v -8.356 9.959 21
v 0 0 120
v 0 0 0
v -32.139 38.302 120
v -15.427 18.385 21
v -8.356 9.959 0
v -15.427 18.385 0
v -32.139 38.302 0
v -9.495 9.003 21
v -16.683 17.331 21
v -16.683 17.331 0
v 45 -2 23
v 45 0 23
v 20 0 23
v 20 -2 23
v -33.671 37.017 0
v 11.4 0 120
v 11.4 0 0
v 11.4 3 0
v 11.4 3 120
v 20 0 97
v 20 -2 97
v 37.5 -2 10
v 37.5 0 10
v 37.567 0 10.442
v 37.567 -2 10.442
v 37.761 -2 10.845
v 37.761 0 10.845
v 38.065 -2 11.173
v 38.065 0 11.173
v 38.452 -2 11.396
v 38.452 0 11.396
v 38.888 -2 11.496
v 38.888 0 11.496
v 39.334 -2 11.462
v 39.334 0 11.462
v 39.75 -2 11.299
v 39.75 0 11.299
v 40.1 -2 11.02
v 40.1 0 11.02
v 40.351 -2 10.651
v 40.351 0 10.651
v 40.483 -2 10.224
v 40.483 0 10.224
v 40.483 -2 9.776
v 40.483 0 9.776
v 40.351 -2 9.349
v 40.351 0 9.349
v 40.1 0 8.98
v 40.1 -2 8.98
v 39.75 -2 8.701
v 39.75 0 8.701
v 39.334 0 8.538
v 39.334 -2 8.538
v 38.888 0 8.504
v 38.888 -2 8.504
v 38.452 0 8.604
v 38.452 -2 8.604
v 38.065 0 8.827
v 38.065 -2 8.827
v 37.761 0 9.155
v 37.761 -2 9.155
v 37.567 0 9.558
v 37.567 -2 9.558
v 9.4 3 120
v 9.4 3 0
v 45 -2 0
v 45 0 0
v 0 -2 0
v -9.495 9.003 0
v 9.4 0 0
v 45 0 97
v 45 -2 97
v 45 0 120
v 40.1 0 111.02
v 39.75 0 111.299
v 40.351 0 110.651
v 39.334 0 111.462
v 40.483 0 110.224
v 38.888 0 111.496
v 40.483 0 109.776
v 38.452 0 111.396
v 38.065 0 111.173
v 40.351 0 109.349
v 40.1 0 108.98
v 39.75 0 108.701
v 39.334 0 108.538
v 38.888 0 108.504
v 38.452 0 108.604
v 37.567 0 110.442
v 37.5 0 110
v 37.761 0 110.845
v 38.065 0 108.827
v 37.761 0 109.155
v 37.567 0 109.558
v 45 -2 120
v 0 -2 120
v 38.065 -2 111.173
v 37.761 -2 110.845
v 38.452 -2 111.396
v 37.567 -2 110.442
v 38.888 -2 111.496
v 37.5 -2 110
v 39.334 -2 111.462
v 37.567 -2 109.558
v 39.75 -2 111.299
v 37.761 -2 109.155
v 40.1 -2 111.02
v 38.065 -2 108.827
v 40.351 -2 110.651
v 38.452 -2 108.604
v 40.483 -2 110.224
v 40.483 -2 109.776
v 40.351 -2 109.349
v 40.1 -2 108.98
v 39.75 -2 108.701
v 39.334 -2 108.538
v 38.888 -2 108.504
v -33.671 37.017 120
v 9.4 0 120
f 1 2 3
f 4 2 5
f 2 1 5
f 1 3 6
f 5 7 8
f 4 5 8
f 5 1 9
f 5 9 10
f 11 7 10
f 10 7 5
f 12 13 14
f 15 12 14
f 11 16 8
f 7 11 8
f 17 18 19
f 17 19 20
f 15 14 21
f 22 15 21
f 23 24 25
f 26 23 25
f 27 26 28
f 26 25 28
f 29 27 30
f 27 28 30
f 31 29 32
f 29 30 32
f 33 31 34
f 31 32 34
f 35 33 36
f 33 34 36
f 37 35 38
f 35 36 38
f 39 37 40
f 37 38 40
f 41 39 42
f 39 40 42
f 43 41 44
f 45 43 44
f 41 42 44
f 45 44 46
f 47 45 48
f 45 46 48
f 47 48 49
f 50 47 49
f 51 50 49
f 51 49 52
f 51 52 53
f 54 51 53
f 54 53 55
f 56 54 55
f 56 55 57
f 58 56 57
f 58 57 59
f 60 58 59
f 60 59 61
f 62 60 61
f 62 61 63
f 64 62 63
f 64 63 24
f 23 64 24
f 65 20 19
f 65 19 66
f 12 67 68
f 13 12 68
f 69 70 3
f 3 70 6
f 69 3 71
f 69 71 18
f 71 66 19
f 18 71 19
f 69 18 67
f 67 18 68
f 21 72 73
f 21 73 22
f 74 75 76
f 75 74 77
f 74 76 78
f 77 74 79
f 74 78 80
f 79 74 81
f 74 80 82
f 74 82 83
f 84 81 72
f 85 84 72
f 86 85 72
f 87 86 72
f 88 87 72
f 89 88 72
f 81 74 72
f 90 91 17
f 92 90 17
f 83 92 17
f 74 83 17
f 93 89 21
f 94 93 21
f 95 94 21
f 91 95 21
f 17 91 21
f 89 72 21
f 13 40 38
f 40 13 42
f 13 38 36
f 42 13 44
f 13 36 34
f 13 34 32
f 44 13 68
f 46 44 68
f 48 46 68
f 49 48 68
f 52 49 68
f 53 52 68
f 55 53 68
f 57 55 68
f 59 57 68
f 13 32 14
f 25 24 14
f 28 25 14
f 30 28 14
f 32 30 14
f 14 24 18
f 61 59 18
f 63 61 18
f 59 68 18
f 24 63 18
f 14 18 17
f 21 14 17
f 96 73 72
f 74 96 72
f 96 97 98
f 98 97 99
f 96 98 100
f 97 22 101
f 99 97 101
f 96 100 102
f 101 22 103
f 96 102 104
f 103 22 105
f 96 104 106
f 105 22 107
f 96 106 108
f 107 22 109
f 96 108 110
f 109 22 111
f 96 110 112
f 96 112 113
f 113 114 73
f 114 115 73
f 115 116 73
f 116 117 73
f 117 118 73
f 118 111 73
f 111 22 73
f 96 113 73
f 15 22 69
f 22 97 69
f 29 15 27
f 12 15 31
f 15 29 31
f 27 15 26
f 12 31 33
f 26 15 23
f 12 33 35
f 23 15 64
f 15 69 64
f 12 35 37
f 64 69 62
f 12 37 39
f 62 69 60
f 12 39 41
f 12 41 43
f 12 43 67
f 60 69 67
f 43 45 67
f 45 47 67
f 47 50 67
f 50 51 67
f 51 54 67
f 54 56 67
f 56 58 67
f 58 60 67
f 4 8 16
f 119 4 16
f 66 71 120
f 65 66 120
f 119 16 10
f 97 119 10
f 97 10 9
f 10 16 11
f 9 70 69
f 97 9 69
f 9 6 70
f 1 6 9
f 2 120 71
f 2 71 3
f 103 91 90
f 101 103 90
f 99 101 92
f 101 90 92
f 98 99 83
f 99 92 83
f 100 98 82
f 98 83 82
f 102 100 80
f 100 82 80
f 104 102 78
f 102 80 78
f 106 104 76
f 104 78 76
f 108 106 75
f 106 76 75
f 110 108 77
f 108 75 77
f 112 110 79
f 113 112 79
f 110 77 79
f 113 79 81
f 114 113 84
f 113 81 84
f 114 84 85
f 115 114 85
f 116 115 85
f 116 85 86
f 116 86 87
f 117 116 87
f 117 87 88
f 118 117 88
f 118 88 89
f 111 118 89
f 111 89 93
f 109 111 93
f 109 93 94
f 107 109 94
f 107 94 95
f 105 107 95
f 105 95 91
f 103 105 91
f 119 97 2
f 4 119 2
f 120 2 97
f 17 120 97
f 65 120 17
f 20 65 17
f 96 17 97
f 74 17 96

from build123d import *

# Parameters (mm, degrees)
F1_DEPTH = 120
F6_R     = 1.5
F6_W     = 25
F6_H     = 74
F2_DEPTH = 2.001
F6_W_2   = 2
F6_H_2   = 120
F3_DEPTH = 3
F4_W     = 11
F4_H     = 21
F5_DEPTH = 25


with BuildPart() as f1:
    # F0 (on Top) → F1 (new body)
    with BuildSketch(Plane.XY):
        Polygon((45, 0), (0, 0), (-32.1393804843, 38.3022221559), (-33.6714693706, 37.0166469366), (0, -2), (45, -2), align=None)
    extrude(amount=F1_DEPTH)

    # F6 (on face) → F2 (cut, through all)
    with BuildSketch(Plane(origin=(0, 0, 0), x_dir=(-1, 0, 0), z_dir=(0, 1, 0))):
        with Locations((-39, 110)):
            Circle(F6_R)
        with Locations((-39, 10)):
            Circle(F6_R)
        with Locations((-32.5, 60)):
            Rectangle(F6_W, F6_H)
    extrude(amount=-F2_DEPTH, mode=Mode.SUBTRACT)

    # F6 (on face) → F3 (join)
    with BuildSketch(Plane(origin=(0, 0, 0), x_dir=(-1, 0, 0), z_dir=(0, 1, 0))):
        with Locations((-10.4, 60)):
            Rectangle(F6_W_2, F6_H_2)
    extrude(amount=F3_DEPTH)

    # F4 (on face) → F5 (cut)
    with BuildSketch(Plane(origin=(0, 0, 0), x_dir=(-0.6427876097, 0.7660444431, 0), z_dir=(0.7660444431, 0.6427876097, 0))):
        with Locations((18.5, 10.5)):
            Rectangle(F4_W, F4_H)
    extrude(amount=-F5_DEPTH, mode=Mode.SUBTRACT)


solid = f1.part
